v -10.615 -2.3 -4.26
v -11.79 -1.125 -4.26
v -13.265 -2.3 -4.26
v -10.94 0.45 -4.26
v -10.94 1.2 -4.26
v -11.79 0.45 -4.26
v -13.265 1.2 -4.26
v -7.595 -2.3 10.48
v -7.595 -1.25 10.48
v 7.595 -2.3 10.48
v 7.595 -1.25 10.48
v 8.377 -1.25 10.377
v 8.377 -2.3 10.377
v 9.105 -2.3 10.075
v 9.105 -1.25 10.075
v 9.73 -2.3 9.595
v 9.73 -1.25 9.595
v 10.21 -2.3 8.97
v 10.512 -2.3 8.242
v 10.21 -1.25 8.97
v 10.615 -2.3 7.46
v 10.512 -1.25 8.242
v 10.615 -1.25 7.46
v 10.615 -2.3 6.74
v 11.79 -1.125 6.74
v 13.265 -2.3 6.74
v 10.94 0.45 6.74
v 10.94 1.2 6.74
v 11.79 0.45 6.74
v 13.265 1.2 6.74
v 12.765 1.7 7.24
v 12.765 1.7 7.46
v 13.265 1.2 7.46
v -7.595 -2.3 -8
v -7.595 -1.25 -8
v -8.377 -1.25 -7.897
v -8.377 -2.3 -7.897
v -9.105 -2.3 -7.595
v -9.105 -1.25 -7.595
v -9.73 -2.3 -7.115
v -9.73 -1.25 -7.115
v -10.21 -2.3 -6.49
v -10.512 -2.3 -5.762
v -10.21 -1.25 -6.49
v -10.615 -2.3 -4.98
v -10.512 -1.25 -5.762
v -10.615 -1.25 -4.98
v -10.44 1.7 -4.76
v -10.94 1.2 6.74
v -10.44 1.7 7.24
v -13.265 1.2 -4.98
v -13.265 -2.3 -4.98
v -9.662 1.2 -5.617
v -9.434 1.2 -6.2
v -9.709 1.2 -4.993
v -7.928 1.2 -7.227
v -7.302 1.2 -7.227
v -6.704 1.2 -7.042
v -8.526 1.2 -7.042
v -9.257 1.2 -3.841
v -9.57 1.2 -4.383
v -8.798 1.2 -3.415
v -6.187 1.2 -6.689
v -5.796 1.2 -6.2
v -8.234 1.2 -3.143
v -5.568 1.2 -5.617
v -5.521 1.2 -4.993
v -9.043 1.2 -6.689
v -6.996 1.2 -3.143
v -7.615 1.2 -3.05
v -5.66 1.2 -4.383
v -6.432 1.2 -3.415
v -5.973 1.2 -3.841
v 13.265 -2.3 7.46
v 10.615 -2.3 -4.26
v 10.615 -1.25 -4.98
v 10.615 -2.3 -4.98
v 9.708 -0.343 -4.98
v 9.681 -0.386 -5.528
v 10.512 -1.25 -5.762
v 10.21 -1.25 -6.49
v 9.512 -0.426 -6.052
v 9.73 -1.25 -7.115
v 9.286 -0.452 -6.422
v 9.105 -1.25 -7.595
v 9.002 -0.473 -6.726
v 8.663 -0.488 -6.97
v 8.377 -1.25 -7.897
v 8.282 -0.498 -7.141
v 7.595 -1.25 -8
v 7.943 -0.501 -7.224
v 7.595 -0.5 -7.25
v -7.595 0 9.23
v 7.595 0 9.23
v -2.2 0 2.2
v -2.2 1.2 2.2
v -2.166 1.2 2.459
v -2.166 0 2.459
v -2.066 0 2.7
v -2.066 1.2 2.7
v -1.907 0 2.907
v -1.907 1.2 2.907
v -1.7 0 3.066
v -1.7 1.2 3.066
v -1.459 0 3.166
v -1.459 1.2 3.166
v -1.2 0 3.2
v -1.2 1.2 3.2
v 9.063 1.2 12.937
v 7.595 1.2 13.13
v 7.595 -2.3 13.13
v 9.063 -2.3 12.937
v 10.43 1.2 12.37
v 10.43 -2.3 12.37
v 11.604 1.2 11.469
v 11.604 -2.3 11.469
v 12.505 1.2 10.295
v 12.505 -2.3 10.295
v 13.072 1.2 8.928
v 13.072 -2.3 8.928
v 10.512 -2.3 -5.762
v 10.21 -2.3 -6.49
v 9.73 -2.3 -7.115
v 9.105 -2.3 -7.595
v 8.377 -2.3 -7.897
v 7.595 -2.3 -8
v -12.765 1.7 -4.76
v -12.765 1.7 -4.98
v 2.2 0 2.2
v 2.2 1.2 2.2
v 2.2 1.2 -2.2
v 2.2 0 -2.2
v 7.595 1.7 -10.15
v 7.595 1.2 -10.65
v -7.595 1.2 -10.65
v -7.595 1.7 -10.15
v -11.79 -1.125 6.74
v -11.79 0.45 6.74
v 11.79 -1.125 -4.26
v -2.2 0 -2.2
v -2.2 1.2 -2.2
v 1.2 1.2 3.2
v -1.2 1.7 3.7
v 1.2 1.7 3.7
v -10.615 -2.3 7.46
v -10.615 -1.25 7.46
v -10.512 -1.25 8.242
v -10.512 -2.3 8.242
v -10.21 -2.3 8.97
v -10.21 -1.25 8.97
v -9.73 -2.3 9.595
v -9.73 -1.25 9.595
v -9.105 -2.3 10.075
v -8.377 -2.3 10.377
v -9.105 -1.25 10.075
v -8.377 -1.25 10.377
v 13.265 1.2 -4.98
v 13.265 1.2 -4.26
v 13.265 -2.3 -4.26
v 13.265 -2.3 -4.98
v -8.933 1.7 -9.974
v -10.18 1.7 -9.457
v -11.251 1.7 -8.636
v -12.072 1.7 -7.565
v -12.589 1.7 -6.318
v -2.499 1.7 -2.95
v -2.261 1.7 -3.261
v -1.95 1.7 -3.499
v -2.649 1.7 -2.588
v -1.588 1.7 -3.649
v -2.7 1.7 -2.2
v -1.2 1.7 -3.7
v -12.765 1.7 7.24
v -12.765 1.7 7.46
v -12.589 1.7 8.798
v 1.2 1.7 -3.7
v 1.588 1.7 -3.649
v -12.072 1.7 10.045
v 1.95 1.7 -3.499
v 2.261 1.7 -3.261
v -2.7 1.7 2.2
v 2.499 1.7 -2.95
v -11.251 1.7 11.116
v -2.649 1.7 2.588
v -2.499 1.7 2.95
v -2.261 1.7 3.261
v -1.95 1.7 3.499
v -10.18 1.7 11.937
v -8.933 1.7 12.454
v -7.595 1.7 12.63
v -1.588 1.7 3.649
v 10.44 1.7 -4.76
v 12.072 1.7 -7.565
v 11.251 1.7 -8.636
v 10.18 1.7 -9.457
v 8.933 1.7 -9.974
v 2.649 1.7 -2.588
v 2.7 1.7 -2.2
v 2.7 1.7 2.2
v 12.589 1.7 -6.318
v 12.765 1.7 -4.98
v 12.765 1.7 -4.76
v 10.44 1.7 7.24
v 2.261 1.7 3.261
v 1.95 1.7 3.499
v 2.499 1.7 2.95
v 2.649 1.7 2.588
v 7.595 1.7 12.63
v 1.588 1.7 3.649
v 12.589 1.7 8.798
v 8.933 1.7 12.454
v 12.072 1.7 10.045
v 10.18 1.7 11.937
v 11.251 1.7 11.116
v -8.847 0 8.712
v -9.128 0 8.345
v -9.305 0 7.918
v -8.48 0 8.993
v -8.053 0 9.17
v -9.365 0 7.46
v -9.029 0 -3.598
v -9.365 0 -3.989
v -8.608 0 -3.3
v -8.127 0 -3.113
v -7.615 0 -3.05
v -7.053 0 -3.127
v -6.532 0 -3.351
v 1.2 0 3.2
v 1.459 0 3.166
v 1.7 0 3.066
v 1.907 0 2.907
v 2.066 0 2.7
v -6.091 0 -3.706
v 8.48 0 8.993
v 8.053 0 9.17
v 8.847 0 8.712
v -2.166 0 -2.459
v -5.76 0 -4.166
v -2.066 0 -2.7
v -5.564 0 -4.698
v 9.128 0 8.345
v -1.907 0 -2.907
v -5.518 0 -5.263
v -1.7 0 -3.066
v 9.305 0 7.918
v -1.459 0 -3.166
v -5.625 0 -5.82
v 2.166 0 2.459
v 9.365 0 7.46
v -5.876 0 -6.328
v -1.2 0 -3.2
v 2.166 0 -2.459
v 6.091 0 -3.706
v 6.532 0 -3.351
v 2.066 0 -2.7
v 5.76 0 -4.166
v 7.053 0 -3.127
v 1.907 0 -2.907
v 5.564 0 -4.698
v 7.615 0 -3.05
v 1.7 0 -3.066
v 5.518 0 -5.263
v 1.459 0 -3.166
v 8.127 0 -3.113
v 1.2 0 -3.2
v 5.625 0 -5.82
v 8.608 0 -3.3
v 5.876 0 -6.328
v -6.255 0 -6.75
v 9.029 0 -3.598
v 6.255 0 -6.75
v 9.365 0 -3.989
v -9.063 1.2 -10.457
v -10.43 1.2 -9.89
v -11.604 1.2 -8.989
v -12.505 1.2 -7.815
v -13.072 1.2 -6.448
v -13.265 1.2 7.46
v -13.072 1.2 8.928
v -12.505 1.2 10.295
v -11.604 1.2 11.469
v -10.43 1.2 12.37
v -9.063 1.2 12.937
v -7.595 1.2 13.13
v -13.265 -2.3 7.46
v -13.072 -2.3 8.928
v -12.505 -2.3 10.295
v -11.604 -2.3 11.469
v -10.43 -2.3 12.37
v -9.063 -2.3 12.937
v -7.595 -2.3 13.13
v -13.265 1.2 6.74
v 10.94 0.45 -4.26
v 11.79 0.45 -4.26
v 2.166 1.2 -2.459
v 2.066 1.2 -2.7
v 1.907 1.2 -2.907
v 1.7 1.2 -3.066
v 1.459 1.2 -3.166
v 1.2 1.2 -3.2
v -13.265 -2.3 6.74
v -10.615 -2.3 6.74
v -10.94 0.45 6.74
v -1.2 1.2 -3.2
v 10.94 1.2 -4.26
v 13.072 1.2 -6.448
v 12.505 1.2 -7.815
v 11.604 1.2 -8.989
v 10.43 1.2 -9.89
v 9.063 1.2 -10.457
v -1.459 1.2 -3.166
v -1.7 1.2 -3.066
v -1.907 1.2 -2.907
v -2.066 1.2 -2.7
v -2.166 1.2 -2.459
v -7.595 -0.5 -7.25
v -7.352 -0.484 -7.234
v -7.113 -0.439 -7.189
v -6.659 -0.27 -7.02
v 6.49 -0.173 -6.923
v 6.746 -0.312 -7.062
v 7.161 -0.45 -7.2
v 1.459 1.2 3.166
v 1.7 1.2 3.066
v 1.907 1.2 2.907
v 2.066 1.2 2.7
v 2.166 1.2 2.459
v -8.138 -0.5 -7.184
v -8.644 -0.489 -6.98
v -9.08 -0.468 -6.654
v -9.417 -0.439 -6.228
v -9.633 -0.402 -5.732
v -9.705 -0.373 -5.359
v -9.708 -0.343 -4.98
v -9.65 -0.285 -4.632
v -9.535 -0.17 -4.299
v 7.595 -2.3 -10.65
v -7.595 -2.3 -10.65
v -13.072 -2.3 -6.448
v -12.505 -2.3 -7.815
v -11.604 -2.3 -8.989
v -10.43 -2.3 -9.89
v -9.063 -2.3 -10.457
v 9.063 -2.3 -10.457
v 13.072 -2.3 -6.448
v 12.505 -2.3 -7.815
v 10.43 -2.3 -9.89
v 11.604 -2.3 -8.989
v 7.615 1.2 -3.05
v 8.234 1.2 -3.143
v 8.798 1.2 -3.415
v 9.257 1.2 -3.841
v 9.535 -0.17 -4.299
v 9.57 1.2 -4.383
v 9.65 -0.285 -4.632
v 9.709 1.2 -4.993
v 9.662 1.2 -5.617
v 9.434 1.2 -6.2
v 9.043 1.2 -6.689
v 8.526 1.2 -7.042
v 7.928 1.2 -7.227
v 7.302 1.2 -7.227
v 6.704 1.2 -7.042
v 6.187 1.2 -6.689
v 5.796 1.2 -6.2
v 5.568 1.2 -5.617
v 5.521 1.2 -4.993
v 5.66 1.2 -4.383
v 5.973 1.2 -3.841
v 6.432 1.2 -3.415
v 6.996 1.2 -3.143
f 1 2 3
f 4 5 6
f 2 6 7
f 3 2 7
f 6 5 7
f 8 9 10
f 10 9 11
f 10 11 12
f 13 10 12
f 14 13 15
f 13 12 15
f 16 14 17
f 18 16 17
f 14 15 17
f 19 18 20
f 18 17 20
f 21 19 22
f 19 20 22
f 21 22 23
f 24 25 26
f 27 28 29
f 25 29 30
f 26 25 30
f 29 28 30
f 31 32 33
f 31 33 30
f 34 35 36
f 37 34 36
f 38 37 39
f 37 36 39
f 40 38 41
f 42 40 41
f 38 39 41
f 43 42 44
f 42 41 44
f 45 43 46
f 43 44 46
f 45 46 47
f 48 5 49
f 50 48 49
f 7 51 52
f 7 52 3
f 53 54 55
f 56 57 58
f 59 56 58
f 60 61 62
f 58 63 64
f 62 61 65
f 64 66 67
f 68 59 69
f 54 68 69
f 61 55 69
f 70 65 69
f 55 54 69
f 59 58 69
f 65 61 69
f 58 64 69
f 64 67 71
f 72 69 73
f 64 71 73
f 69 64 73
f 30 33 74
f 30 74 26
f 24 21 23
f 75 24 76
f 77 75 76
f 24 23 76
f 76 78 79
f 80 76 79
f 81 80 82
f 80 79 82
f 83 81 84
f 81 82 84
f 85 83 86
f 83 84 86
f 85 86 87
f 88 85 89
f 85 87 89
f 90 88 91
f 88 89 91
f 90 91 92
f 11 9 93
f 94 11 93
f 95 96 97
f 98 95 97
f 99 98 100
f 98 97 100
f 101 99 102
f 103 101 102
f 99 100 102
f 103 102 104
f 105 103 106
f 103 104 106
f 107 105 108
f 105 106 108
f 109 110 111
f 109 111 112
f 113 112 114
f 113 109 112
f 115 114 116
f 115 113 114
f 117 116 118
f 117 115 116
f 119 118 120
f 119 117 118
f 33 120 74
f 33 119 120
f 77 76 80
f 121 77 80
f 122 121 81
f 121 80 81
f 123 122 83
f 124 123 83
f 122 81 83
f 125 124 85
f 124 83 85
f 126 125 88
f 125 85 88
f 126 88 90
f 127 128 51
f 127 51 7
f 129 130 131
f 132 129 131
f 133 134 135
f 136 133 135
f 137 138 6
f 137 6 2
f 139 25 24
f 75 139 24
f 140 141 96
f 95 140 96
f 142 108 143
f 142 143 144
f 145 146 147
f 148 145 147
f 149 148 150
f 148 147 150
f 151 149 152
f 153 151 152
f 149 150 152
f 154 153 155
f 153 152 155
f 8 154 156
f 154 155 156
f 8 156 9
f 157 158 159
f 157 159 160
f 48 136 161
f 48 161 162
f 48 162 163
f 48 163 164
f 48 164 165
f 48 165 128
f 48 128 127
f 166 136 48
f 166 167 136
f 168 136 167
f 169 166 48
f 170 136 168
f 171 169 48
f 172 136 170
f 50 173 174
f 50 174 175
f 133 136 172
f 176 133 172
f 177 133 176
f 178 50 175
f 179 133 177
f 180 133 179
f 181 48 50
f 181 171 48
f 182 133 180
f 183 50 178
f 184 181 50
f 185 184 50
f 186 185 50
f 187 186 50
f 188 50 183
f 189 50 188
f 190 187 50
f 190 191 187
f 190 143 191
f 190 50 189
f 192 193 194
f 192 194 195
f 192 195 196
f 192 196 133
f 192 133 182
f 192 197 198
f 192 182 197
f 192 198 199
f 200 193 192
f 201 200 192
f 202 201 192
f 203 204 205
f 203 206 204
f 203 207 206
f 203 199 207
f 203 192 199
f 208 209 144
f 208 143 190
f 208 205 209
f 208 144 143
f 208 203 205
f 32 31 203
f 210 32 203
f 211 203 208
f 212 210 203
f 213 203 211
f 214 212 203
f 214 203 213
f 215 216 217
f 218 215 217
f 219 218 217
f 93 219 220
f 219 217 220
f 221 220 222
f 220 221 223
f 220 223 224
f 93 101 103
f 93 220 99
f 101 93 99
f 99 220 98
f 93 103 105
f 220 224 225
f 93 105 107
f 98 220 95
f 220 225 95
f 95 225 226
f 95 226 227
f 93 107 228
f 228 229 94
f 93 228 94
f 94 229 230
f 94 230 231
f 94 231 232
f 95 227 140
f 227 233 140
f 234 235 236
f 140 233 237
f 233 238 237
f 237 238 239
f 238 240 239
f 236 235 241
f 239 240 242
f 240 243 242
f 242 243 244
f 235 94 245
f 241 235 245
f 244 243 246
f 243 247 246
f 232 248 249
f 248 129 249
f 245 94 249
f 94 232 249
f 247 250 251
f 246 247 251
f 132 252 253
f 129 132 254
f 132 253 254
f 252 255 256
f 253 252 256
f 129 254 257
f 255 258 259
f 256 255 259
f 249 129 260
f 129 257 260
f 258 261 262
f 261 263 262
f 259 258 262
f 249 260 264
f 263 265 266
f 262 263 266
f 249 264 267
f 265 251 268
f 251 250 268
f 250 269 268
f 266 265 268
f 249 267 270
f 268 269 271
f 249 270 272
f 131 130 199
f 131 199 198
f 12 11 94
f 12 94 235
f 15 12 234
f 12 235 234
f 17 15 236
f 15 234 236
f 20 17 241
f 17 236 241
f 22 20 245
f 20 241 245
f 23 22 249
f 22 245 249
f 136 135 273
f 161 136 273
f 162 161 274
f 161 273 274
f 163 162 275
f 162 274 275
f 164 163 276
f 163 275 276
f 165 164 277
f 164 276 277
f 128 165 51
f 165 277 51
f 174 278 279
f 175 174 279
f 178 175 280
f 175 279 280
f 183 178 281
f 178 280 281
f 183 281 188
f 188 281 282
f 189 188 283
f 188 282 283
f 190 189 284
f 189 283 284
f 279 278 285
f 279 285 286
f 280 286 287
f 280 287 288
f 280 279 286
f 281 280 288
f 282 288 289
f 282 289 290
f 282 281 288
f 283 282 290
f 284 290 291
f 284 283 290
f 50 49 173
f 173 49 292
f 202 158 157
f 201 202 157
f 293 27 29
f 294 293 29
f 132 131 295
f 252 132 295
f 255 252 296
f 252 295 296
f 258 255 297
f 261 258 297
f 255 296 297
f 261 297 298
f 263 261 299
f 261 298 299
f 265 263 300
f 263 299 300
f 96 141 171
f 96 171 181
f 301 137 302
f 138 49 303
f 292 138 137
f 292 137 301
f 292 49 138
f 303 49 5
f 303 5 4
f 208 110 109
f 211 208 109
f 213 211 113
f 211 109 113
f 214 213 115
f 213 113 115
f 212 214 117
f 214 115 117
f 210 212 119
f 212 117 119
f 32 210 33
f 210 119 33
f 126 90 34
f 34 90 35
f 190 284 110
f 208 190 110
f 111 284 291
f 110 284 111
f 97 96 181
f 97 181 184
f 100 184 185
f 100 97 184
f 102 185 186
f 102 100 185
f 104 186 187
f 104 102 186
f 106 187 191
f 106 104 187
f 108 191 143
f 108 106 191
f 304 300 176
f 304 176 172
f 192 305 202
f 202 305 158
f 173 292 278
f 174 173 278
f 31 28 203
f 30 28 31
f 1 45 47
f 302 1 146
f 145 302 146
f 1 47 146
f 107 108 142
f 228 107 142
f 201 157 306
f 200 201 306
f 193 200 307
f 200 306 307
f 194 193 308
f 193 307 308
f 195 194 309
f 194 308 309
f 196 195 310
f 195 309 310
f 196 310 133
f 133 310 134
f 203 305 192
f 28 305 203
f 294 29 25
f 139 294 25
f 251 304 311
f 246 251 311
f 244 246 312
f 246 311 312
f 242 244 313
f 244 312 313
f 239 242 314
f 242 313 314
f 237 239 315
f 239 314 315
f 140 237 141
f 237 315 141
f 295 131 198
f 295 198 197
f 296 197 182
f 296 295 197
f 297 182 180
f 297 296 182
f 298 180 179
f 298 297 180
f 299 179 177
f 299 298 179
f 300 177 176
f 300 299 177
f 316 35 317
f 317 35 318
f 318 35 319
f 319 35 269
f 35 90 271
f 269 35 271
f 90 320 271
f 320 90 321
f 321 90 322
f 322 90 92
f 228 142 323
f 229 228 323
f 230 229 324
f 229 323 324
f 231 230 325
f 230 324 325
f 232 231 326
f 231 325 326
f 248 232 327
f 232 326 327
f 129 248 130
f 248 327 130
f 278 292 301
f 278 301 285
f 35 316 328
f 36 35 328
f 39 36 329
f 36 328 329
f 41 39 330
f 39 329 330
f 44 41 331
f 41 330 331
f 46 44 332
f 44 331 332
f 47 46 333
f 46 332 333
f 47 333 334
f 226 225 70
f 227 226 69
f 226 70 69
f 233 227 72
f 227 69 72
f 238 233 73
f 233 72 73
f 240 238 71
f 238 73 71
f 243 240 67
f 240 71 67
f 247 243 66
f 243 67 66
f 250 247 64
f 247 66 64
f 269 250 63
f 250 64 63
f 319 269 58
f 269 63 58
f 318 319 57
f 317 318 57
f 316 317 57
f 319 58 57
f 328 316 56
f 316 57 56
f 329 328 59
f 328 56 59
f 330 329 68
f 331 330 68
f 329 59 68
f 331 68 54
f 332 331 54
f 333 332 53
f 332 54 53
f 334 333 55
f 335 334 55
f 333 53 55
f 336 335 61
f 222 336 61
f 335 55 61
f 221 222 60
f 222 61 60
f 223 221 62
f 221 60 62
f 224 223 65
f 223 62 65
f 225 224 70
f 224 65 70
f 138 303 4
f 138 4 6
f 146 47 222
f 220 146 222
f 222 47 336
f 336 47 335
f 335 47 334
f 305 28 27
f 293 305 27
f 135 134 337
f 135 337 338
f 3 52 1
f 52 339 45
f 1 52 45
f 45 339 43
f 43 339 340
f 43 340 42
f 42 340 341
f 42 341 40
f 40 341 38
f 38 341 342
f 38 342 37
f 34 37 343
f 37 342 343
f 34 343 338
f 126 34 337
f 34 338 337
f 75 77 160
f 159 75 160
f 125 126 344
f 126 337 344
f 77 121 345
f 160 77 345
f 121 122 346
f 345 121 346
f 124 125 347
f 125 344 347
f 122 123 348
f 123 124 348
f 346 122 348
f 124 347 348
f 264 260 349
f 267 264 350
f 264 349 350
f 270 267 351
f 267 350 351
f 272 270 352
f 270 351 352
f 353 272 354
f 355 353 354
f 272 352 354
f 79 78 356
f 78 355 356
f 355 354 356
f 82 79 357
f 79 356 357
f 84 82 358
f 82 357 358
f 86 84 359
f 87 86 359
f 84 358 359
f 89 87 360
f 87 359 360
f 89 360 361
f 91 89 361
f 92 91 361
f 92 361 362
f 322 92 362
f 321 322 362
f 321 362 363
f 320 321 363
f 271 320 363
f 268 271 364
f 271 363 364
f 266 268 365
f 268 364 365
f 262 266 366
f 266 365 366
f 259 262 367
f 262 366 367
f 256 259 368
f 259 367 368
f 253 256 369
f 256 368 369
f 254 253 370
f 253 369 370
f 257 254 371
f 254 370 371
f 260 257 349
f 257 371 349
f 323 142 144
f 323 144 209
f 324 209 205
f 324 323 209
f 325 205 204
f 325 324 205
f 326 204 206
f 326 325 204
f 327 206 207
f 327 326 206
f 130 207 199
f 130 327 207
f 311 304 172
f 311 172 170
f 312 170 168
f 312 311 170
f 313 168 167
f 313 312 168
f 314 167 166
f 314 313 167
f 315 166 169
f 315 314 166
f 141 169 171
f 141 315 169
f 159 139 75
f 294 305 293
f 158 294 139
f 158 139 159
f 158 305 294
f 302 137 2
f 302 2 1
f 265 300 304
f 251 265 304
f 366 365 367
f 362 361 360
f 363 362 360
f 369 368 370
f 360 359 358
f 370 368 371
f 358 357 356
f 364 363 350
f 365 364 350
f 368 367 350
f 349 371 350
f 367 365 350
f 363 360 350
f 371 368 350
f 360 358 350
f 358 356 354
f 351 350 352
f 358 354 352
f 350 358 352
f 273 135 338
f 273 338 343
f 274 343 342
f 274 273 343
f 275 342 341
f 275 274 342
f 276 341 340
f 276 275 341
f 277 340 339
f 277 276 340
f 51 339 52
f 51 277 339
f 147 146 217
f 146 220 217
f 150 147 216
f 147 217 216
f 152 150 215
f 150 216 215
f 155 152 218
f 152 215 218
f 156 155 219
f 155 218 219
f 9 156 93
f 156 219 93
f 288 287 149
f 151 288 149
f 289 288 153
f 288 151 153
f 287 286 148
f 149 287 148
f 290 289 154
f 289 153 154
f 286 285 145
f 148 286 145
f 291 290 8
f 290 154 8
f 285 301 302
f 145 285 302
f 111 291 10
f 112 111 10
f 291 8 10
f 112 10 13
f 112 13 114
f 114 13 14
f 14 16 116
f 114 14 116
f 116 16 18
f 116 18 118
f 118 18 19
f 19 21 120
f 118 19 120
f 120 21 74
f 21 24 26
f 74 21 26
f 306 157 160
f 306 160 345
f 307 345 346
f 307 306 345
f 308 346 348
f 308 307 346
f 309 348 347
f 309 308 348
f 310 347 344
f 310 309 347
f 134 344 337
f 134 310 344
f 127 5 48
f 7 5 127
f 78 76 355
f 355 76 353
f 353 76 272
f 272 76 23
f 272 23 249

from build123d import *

# Parameters (mm, degrees)
BOSS_EXTRUDE1_DEPTH = 4
CUT_EXTRUDE1_START  = -1.7
CUT_EXTRUDE1_DEPTH  = 18.388140952
CUT_EXTRUDE2_DEPTH  = 20.088140952
SKETCH11_R          = 2.1
CUT_EXTRUDE4_DEPTH  = 20.088140952
CHAMFER1_SIZE       = 1.25
CUT_EXTRUDE5_DEPTH  = 5.5
SKETCH13_R          = 2.1
BOSS_EXTRUDE4_DEPTH = 0.5
CHAMFER3_SIZE       = 0.5


with BuildPart() as part:
    # Sketch1 → Boss-Extrude1 (new body)
    with BuildSketch(Plane(origin=(0, 1.7, 0), x_dir=(1, 0, 0), z_dir=(0, 1, 0))):
        with BuildLine():
            Line((-13.265, 4.98), (-13.265, -7.46))
            ThreePointArc((-13.265, -7.46), (-11.604295449, -11.469295449), (-7.595, -13.13))
            Line((-7.595, -13.13), (7.595, -13.13))
            ThreePointArc((7.595, -13.13), (11.604295449, -11.469295449), (13.265, -7.46))
            Line((13.265, -7.46), (13.265, 4.98))
            ThreePointArc((13.265, 4.98), (11.604295449, 8.989295449), (7.595, 10.65))
            Line((7.595, 10.65), (-7.595, 10.65))
            ThreePointArc((-7.595, 10.65), (-11.604295449, 8.989295449), (-13.265, 4.98))
        make_face()
    extrude(amount=-BOSS_EXTRUDE1_DEPTH)

    # Sketch5 → Cut-Extrude1 (cut, through all)
    with BuildSketch(Plane(origin=(0, 1.7, 0), x_dir=(1, 0, 0), z_dir=(0, 1, 0)).offset(CUT_EXTRUDE1_START)):
        with BuildLine():
            Line((-7.595, -10.48), (7.595, -10.48))
            ThreePointArc((7.595, -10.48), (9.730462479, -9.595462479), (10.615, -7.46))
            Line((10.615, -7.46), (10.615, 4.98))
            ThreePointArc((10.615, 4.98), (9.730462479, 7.115462479), (7.595, 8))
            Line((7.595, 8), (-7.595, 8))
            ThreePointArc((-7.595, 8), (-9.730462479, 7.115462479), (-10.615, 4.98))
            Line((-10.615, 4.98), (-10.615, -7.46))
            ThreePointArc((-10.615, -7.46), (-9.730462479, -9.595462479), (-7.595, -10.48))
        make_face()
    extrude(amount=-CUT_EXTRUDE1_DEPTH, mode=Mode.SUBTRACT)

    # Sketch7 → Cut-Extrude2 (cut, through all)
    with BuildSketch(Plane(origin=(0, 1.7, 0), x_dir=(1, 0, 0), z_dir=(0, 1, 0))):
        with BuildLine():
            Line((2.2, -2.2), (2.2, 2.2))
            ThreePointArc((2.2, 2.2), (1.907106781, 2.907106781), (1.2, 3.2))
            Line((1.2, 3.2), (-1.2, 3.2))
            ThreePointArc((-1.2, 3.2), (-1.907106781, 2.907106781), (-2.2, 2.2))
            Line((-2.2, 2.2), (-2.2, -2.2))
            ThreePointArc((-2.2, -2.2), (-1.907106781, -2.907106781), (-1.2, -3.2))
            Line((-1.2, -3.2), (1.2, -3.2))
            ThreePointArc((1.2, -3.2), (1.907106781, -2.907106781), (2.2, -2.2))
        make_face()
    extrude(amount=-CUT_EXTRUDE2_DEPTH, mode=Mode.SUBTRACT)

    # Sketch11 → Cut-Extrude4 (cut, through all)
    with BuildSketch(Plane(origin=(0, 1.7, 0), x_dir=(1, 0, 0), z_dir=(0, 1, 0))):
        with Locations(Location((-7.615, 5.15, 0), (0, 0, 270))):
            Circle(SKETCH11_R)
        with Locations(Location((7.615, 5.15, 0), (0, 0, 270))):
            Circle(SKETCH11_R)
    extrude(amount=-CUT_EXTRUDE4_DEPTH, mode=Mode.SUBTRACT)

    # Chamfer1
    # the kernel refuses this chamfer: 1.25 mm, written as the material it adds along each edge
    with BuildSketch(Plane(origin=(-7.595, 0, 7.46), x_dir=(-1, 0, 0), z_dir=(0, 0, -1))) as chamfer1_piece_1:
        Polygon((3.02, -CHAMFER1_SIZE), (3.02 - CHAMFER1_SIZE, 0), (3.02, 0), align=None)
    revolve(axis=Axis((-7.595, 0, 7.46), (0, 1, 0)), revolution_arc=90)
    with BuildSketch(Plane(origin=(-7.595, 0, 10.48), x_dir=(0, -0.9996219169112968, 0.027495876610586317), z_dir=(1, 0, 0))) as chamfer1_piece_2:
        Polygon((CHAMFER1_SIZE * 0.999621916911, CHAMFER1_SIZE * 0.0274958766106), (-CHAMFER1_SIZE * 0.0274958766106, CHAMFER1_SIZE * 0.999621916911), (0, 0), align=None)
    extrude(amount=15.19)
    with BuildSketch(Plane(origin=(7.595, 0, 7.46), x_dir=(0, 0, 1), z_dir=(-1, 0, 0))) as chamfer1_piece_3:
        Polygon((3.02, -CHAMFER1_SIZE), (3.02 - CHAMFER1_SIZE, 0), (3.02, 0), align=None)
    revolve(axis=Axis((7.595, 0, 7.46), (0, 1, 0)), revolution_arc=90)
    with BuildSketch(Plane(origin=(10.615, 0, 7.46), x_dir=(0.027495876610586317, -0.9996219169112968, 0), z_dir=(0, 0, -1))) as chamfer1_piece_4_section:
        Polygon((CHAMFER1_SIZE * 0.999621916911, CHAMFER1_SIZE * 0.0274958766106), (-CHAMFER1_SIZE * 0.0274958766106, CHAMFER1_SIZE * 0.999621916911), (0, 0), align=None)
    chamfer1_piece_4 = extrude(amount=12.44, mode=Mode.PRIVATE)
    chamfer1_piece_4 = chamfer1_piece_4 - Plane(origin=(7.615, -0.413583305, -5.15), x_dir=(0, 0, 1), z_dir=(0, 1, 0)) * Cylinder(2.1, 30, mode=Mode.PRIVATE)
    add(chamfer1_piece_4)
    with BuildSketch(Plane(origin=(7.595, 0, -4.98), x_dir=(1, 0, 0), z_dir=(0, 0, 1))) as chamfer1_piece_5_section:
        Polygon((3.02, -CHAMFER1_SIZE), (3.02 - CHAMFER1_SIZE, 0), (3.02, 0), align=None)
    chamfer1_piece_5 = revolve(axis=Axis((7.595, 0, -4.98), (0, 1, 0)), revolution_arc=90, mode=Mode.PRIVATE)
    chamfer1_piece_5 = chamfer1_piece_5 - Plane(origin=(7.615, -0.471032406, -5.15), x_dir=(0, 0, 1), z_dir=(0, 1, 0)) * Cylinder(2.1, 13, mode=Mode.PRIVATE)
    add(chamfer1_piece_5)
    with BuildSketch(Plane(origin=(7.595, 0, -8), x_dir=(0, -0.9996219169112968, -0.027495876610586317), z_dir=(-1, 0, 0))) as chamfer1_piece_6_section:
        Polygon((CHAMFER1_SIZE * 0.999621916911, CHAMFER1_SIZE * 0.0274958766106), (-CHAMFER1_SIZE * 0.0274958766106, CHAMFER1_SIZE * 0.999621916911), (0, 0), align=None)
    chamfer1_piece_6 = extrude(amount=15.19, mode=Mode.PRIVATE)
    chamfer1_piece_6 = chamfer1_piece_6 - Plane(origin=(-7.615, -0.417580446, -5.15), x_dir=(0, 0, 1), z_dir=(0, 1, 0)) * Cylinder(2.1, 36, mode=Mode.PRIVATE)
    chamfer1_piece_6 = chamfer1_piece_6 - Plane(origin=(7.615, -0.417580446, -5.15), x_dir=(0, 0, 1), z_dir=(0, 1, 0)) * Cylinder(2.1, 36, mode=Mode.PRIVATE)
    add(chamfer1_piece_6)
    with BuildSketch(Plane(origin=(-7.595, 0, -4.98), x_dir=(0, 0, -1), z_dir=(1, 0, 0))) as chamfer1_piece_7_section:
        Polygon((3.02, -CHAMFER1_SIZE), (3.02 - CHAMFER1_SIZE, 0), (3.02, 0), align=None)
    chamfer1_piece_7 = revolve(axis=Axis((-7.595, 0, -4.98), (0, 1, 0)), revolution_arc=90, mode=Mode.PRIVATE)
    chamfer1_piece_7 = chamfer1_piece_7 - Plane(origin=(-7.615, -0.471032404, -5.15), x_dir=(0, 0, 1), z_dir=(0, 1, 0)) * Cylinder(2.1, 13, mode=Mode.PRIVATE)
    add(chamfer1_piece_7)
    with BuildSketch(Plane(origin=(-10.615, 0, -4.98), x_dir=(-0.027495876610586317, -0.9996219169112968, 0), z_dir=(0, 0, 1))) as chamfer1_piece_8_section:
        Polygon((CHAMFER1_SIZE * 0.999621916911, CHAMFER1_SIZE * 0.0274958766106), (-CHAMFER1_SIZE * 0.0274958766106, CHAMFER1_SIZE * 0.999621916911), (0, 0), align=None)
    chamfer1_piece_8 = extrude(amount=12.44, mode=Mode.PRIVATE)
    chamfer1_piece_8 = chamfer1_piece_8 - Plane(origin=(-7.615, -0.413583304, -5.15), x_dir=(0, 0, 1), z_dir=(0, 1, 0)) * Cylinder(2.1, 30, mode=Mode.PRIVATE)
    add(chamfer1_piece_8)

    # Sketch12 → Cut-Extrude5 (cut, symmetric)
    with BuildSketch(Plane.XY.offset(1.24)):
        Polygon((11.79, -2.45), (13.415, -2.45), (13.415, 1.85), (10.94, 1.85), (10.94, 0.45), (11.79, 0.45), (11.79, -1.125), (10.615, -2.3), (11.79, -2.3), align=None)
    cut_extrude5 = extrude(amount=CUT_EXTRUDE5_DEPTH, both=True, mode=Mode.SUBTRACT)

    # Mirror1: Cut-Extrude5 across plane
    add(cut_extrude5.mirror(Plane(origin=(0, 0, 0), x_dir=(0, 0, 1), z_dir=(1, 0, 0))), mode=Mode.SUBTRACT)

    # Sketch13 → Boss-Extrude4 (add)
    with BuildSketch(Plane(origin=(0, 1.7, 0), x_dir=(1, 0, 0), z_dir=(0, 1, 0))):
        with Locations(Location((7.615, 5.15, 0), (0, 0, 270))):
            Circle(SKETCH13_R)
        with Locations(Location((-7.615, 5.15, 0), (0, 0, 270))):
            Circle(SKETCH13_R)
    extrude(amount=-BOSS_EXTRUDE4_DEPTH)

    # Chamfer3
    chamfer3_edges = [part.edges().sort_by_distance(p)[0] for p in [
        (-13.265, 1.7, -4.62),
        (-11.604295449, 1.7, -8.989295449),
        (13.265, 1.7, -4.62),
        (10.94, 1.7, 1.24),
        (12.1025, 1.7, 6.74),
        (12.1025, 1.7, -4.26),
        (-13.265, 1.7, 7.1),
        (-10.94, 1.7, 1.24),
        (-12.1025, 1.7, 6.74),
        (-12.1025, 1.7, -4.26),
        (-1.907106781, 1.7, 2.907106781),
        (0, 1.7, 3.2),
        (1.907106781, 1.7, 2.907106781),
        (2.2, 1.7, 0),
        (1.907106781, 1.7, -2.907106781),
        (0, 1.7, -3.2),
        (0, 1.7, -10.65),
        (-1.907106781, 1.7, -2.907106781),
        (-2.2, 1.7, 0),
        (11.604295449, 1.7, -8.989295449),
        (13.265, 1.7, 7.1),
        (11.604295449, 1.7, 11.469295449),
        (0, 1.7, 13.13),
        (-11.604295449, 1.7, 11.469295449),
    ]]
    chamfer(chamfer3_edges, length=CHAMFER3_SIZE)


solid = part.part
